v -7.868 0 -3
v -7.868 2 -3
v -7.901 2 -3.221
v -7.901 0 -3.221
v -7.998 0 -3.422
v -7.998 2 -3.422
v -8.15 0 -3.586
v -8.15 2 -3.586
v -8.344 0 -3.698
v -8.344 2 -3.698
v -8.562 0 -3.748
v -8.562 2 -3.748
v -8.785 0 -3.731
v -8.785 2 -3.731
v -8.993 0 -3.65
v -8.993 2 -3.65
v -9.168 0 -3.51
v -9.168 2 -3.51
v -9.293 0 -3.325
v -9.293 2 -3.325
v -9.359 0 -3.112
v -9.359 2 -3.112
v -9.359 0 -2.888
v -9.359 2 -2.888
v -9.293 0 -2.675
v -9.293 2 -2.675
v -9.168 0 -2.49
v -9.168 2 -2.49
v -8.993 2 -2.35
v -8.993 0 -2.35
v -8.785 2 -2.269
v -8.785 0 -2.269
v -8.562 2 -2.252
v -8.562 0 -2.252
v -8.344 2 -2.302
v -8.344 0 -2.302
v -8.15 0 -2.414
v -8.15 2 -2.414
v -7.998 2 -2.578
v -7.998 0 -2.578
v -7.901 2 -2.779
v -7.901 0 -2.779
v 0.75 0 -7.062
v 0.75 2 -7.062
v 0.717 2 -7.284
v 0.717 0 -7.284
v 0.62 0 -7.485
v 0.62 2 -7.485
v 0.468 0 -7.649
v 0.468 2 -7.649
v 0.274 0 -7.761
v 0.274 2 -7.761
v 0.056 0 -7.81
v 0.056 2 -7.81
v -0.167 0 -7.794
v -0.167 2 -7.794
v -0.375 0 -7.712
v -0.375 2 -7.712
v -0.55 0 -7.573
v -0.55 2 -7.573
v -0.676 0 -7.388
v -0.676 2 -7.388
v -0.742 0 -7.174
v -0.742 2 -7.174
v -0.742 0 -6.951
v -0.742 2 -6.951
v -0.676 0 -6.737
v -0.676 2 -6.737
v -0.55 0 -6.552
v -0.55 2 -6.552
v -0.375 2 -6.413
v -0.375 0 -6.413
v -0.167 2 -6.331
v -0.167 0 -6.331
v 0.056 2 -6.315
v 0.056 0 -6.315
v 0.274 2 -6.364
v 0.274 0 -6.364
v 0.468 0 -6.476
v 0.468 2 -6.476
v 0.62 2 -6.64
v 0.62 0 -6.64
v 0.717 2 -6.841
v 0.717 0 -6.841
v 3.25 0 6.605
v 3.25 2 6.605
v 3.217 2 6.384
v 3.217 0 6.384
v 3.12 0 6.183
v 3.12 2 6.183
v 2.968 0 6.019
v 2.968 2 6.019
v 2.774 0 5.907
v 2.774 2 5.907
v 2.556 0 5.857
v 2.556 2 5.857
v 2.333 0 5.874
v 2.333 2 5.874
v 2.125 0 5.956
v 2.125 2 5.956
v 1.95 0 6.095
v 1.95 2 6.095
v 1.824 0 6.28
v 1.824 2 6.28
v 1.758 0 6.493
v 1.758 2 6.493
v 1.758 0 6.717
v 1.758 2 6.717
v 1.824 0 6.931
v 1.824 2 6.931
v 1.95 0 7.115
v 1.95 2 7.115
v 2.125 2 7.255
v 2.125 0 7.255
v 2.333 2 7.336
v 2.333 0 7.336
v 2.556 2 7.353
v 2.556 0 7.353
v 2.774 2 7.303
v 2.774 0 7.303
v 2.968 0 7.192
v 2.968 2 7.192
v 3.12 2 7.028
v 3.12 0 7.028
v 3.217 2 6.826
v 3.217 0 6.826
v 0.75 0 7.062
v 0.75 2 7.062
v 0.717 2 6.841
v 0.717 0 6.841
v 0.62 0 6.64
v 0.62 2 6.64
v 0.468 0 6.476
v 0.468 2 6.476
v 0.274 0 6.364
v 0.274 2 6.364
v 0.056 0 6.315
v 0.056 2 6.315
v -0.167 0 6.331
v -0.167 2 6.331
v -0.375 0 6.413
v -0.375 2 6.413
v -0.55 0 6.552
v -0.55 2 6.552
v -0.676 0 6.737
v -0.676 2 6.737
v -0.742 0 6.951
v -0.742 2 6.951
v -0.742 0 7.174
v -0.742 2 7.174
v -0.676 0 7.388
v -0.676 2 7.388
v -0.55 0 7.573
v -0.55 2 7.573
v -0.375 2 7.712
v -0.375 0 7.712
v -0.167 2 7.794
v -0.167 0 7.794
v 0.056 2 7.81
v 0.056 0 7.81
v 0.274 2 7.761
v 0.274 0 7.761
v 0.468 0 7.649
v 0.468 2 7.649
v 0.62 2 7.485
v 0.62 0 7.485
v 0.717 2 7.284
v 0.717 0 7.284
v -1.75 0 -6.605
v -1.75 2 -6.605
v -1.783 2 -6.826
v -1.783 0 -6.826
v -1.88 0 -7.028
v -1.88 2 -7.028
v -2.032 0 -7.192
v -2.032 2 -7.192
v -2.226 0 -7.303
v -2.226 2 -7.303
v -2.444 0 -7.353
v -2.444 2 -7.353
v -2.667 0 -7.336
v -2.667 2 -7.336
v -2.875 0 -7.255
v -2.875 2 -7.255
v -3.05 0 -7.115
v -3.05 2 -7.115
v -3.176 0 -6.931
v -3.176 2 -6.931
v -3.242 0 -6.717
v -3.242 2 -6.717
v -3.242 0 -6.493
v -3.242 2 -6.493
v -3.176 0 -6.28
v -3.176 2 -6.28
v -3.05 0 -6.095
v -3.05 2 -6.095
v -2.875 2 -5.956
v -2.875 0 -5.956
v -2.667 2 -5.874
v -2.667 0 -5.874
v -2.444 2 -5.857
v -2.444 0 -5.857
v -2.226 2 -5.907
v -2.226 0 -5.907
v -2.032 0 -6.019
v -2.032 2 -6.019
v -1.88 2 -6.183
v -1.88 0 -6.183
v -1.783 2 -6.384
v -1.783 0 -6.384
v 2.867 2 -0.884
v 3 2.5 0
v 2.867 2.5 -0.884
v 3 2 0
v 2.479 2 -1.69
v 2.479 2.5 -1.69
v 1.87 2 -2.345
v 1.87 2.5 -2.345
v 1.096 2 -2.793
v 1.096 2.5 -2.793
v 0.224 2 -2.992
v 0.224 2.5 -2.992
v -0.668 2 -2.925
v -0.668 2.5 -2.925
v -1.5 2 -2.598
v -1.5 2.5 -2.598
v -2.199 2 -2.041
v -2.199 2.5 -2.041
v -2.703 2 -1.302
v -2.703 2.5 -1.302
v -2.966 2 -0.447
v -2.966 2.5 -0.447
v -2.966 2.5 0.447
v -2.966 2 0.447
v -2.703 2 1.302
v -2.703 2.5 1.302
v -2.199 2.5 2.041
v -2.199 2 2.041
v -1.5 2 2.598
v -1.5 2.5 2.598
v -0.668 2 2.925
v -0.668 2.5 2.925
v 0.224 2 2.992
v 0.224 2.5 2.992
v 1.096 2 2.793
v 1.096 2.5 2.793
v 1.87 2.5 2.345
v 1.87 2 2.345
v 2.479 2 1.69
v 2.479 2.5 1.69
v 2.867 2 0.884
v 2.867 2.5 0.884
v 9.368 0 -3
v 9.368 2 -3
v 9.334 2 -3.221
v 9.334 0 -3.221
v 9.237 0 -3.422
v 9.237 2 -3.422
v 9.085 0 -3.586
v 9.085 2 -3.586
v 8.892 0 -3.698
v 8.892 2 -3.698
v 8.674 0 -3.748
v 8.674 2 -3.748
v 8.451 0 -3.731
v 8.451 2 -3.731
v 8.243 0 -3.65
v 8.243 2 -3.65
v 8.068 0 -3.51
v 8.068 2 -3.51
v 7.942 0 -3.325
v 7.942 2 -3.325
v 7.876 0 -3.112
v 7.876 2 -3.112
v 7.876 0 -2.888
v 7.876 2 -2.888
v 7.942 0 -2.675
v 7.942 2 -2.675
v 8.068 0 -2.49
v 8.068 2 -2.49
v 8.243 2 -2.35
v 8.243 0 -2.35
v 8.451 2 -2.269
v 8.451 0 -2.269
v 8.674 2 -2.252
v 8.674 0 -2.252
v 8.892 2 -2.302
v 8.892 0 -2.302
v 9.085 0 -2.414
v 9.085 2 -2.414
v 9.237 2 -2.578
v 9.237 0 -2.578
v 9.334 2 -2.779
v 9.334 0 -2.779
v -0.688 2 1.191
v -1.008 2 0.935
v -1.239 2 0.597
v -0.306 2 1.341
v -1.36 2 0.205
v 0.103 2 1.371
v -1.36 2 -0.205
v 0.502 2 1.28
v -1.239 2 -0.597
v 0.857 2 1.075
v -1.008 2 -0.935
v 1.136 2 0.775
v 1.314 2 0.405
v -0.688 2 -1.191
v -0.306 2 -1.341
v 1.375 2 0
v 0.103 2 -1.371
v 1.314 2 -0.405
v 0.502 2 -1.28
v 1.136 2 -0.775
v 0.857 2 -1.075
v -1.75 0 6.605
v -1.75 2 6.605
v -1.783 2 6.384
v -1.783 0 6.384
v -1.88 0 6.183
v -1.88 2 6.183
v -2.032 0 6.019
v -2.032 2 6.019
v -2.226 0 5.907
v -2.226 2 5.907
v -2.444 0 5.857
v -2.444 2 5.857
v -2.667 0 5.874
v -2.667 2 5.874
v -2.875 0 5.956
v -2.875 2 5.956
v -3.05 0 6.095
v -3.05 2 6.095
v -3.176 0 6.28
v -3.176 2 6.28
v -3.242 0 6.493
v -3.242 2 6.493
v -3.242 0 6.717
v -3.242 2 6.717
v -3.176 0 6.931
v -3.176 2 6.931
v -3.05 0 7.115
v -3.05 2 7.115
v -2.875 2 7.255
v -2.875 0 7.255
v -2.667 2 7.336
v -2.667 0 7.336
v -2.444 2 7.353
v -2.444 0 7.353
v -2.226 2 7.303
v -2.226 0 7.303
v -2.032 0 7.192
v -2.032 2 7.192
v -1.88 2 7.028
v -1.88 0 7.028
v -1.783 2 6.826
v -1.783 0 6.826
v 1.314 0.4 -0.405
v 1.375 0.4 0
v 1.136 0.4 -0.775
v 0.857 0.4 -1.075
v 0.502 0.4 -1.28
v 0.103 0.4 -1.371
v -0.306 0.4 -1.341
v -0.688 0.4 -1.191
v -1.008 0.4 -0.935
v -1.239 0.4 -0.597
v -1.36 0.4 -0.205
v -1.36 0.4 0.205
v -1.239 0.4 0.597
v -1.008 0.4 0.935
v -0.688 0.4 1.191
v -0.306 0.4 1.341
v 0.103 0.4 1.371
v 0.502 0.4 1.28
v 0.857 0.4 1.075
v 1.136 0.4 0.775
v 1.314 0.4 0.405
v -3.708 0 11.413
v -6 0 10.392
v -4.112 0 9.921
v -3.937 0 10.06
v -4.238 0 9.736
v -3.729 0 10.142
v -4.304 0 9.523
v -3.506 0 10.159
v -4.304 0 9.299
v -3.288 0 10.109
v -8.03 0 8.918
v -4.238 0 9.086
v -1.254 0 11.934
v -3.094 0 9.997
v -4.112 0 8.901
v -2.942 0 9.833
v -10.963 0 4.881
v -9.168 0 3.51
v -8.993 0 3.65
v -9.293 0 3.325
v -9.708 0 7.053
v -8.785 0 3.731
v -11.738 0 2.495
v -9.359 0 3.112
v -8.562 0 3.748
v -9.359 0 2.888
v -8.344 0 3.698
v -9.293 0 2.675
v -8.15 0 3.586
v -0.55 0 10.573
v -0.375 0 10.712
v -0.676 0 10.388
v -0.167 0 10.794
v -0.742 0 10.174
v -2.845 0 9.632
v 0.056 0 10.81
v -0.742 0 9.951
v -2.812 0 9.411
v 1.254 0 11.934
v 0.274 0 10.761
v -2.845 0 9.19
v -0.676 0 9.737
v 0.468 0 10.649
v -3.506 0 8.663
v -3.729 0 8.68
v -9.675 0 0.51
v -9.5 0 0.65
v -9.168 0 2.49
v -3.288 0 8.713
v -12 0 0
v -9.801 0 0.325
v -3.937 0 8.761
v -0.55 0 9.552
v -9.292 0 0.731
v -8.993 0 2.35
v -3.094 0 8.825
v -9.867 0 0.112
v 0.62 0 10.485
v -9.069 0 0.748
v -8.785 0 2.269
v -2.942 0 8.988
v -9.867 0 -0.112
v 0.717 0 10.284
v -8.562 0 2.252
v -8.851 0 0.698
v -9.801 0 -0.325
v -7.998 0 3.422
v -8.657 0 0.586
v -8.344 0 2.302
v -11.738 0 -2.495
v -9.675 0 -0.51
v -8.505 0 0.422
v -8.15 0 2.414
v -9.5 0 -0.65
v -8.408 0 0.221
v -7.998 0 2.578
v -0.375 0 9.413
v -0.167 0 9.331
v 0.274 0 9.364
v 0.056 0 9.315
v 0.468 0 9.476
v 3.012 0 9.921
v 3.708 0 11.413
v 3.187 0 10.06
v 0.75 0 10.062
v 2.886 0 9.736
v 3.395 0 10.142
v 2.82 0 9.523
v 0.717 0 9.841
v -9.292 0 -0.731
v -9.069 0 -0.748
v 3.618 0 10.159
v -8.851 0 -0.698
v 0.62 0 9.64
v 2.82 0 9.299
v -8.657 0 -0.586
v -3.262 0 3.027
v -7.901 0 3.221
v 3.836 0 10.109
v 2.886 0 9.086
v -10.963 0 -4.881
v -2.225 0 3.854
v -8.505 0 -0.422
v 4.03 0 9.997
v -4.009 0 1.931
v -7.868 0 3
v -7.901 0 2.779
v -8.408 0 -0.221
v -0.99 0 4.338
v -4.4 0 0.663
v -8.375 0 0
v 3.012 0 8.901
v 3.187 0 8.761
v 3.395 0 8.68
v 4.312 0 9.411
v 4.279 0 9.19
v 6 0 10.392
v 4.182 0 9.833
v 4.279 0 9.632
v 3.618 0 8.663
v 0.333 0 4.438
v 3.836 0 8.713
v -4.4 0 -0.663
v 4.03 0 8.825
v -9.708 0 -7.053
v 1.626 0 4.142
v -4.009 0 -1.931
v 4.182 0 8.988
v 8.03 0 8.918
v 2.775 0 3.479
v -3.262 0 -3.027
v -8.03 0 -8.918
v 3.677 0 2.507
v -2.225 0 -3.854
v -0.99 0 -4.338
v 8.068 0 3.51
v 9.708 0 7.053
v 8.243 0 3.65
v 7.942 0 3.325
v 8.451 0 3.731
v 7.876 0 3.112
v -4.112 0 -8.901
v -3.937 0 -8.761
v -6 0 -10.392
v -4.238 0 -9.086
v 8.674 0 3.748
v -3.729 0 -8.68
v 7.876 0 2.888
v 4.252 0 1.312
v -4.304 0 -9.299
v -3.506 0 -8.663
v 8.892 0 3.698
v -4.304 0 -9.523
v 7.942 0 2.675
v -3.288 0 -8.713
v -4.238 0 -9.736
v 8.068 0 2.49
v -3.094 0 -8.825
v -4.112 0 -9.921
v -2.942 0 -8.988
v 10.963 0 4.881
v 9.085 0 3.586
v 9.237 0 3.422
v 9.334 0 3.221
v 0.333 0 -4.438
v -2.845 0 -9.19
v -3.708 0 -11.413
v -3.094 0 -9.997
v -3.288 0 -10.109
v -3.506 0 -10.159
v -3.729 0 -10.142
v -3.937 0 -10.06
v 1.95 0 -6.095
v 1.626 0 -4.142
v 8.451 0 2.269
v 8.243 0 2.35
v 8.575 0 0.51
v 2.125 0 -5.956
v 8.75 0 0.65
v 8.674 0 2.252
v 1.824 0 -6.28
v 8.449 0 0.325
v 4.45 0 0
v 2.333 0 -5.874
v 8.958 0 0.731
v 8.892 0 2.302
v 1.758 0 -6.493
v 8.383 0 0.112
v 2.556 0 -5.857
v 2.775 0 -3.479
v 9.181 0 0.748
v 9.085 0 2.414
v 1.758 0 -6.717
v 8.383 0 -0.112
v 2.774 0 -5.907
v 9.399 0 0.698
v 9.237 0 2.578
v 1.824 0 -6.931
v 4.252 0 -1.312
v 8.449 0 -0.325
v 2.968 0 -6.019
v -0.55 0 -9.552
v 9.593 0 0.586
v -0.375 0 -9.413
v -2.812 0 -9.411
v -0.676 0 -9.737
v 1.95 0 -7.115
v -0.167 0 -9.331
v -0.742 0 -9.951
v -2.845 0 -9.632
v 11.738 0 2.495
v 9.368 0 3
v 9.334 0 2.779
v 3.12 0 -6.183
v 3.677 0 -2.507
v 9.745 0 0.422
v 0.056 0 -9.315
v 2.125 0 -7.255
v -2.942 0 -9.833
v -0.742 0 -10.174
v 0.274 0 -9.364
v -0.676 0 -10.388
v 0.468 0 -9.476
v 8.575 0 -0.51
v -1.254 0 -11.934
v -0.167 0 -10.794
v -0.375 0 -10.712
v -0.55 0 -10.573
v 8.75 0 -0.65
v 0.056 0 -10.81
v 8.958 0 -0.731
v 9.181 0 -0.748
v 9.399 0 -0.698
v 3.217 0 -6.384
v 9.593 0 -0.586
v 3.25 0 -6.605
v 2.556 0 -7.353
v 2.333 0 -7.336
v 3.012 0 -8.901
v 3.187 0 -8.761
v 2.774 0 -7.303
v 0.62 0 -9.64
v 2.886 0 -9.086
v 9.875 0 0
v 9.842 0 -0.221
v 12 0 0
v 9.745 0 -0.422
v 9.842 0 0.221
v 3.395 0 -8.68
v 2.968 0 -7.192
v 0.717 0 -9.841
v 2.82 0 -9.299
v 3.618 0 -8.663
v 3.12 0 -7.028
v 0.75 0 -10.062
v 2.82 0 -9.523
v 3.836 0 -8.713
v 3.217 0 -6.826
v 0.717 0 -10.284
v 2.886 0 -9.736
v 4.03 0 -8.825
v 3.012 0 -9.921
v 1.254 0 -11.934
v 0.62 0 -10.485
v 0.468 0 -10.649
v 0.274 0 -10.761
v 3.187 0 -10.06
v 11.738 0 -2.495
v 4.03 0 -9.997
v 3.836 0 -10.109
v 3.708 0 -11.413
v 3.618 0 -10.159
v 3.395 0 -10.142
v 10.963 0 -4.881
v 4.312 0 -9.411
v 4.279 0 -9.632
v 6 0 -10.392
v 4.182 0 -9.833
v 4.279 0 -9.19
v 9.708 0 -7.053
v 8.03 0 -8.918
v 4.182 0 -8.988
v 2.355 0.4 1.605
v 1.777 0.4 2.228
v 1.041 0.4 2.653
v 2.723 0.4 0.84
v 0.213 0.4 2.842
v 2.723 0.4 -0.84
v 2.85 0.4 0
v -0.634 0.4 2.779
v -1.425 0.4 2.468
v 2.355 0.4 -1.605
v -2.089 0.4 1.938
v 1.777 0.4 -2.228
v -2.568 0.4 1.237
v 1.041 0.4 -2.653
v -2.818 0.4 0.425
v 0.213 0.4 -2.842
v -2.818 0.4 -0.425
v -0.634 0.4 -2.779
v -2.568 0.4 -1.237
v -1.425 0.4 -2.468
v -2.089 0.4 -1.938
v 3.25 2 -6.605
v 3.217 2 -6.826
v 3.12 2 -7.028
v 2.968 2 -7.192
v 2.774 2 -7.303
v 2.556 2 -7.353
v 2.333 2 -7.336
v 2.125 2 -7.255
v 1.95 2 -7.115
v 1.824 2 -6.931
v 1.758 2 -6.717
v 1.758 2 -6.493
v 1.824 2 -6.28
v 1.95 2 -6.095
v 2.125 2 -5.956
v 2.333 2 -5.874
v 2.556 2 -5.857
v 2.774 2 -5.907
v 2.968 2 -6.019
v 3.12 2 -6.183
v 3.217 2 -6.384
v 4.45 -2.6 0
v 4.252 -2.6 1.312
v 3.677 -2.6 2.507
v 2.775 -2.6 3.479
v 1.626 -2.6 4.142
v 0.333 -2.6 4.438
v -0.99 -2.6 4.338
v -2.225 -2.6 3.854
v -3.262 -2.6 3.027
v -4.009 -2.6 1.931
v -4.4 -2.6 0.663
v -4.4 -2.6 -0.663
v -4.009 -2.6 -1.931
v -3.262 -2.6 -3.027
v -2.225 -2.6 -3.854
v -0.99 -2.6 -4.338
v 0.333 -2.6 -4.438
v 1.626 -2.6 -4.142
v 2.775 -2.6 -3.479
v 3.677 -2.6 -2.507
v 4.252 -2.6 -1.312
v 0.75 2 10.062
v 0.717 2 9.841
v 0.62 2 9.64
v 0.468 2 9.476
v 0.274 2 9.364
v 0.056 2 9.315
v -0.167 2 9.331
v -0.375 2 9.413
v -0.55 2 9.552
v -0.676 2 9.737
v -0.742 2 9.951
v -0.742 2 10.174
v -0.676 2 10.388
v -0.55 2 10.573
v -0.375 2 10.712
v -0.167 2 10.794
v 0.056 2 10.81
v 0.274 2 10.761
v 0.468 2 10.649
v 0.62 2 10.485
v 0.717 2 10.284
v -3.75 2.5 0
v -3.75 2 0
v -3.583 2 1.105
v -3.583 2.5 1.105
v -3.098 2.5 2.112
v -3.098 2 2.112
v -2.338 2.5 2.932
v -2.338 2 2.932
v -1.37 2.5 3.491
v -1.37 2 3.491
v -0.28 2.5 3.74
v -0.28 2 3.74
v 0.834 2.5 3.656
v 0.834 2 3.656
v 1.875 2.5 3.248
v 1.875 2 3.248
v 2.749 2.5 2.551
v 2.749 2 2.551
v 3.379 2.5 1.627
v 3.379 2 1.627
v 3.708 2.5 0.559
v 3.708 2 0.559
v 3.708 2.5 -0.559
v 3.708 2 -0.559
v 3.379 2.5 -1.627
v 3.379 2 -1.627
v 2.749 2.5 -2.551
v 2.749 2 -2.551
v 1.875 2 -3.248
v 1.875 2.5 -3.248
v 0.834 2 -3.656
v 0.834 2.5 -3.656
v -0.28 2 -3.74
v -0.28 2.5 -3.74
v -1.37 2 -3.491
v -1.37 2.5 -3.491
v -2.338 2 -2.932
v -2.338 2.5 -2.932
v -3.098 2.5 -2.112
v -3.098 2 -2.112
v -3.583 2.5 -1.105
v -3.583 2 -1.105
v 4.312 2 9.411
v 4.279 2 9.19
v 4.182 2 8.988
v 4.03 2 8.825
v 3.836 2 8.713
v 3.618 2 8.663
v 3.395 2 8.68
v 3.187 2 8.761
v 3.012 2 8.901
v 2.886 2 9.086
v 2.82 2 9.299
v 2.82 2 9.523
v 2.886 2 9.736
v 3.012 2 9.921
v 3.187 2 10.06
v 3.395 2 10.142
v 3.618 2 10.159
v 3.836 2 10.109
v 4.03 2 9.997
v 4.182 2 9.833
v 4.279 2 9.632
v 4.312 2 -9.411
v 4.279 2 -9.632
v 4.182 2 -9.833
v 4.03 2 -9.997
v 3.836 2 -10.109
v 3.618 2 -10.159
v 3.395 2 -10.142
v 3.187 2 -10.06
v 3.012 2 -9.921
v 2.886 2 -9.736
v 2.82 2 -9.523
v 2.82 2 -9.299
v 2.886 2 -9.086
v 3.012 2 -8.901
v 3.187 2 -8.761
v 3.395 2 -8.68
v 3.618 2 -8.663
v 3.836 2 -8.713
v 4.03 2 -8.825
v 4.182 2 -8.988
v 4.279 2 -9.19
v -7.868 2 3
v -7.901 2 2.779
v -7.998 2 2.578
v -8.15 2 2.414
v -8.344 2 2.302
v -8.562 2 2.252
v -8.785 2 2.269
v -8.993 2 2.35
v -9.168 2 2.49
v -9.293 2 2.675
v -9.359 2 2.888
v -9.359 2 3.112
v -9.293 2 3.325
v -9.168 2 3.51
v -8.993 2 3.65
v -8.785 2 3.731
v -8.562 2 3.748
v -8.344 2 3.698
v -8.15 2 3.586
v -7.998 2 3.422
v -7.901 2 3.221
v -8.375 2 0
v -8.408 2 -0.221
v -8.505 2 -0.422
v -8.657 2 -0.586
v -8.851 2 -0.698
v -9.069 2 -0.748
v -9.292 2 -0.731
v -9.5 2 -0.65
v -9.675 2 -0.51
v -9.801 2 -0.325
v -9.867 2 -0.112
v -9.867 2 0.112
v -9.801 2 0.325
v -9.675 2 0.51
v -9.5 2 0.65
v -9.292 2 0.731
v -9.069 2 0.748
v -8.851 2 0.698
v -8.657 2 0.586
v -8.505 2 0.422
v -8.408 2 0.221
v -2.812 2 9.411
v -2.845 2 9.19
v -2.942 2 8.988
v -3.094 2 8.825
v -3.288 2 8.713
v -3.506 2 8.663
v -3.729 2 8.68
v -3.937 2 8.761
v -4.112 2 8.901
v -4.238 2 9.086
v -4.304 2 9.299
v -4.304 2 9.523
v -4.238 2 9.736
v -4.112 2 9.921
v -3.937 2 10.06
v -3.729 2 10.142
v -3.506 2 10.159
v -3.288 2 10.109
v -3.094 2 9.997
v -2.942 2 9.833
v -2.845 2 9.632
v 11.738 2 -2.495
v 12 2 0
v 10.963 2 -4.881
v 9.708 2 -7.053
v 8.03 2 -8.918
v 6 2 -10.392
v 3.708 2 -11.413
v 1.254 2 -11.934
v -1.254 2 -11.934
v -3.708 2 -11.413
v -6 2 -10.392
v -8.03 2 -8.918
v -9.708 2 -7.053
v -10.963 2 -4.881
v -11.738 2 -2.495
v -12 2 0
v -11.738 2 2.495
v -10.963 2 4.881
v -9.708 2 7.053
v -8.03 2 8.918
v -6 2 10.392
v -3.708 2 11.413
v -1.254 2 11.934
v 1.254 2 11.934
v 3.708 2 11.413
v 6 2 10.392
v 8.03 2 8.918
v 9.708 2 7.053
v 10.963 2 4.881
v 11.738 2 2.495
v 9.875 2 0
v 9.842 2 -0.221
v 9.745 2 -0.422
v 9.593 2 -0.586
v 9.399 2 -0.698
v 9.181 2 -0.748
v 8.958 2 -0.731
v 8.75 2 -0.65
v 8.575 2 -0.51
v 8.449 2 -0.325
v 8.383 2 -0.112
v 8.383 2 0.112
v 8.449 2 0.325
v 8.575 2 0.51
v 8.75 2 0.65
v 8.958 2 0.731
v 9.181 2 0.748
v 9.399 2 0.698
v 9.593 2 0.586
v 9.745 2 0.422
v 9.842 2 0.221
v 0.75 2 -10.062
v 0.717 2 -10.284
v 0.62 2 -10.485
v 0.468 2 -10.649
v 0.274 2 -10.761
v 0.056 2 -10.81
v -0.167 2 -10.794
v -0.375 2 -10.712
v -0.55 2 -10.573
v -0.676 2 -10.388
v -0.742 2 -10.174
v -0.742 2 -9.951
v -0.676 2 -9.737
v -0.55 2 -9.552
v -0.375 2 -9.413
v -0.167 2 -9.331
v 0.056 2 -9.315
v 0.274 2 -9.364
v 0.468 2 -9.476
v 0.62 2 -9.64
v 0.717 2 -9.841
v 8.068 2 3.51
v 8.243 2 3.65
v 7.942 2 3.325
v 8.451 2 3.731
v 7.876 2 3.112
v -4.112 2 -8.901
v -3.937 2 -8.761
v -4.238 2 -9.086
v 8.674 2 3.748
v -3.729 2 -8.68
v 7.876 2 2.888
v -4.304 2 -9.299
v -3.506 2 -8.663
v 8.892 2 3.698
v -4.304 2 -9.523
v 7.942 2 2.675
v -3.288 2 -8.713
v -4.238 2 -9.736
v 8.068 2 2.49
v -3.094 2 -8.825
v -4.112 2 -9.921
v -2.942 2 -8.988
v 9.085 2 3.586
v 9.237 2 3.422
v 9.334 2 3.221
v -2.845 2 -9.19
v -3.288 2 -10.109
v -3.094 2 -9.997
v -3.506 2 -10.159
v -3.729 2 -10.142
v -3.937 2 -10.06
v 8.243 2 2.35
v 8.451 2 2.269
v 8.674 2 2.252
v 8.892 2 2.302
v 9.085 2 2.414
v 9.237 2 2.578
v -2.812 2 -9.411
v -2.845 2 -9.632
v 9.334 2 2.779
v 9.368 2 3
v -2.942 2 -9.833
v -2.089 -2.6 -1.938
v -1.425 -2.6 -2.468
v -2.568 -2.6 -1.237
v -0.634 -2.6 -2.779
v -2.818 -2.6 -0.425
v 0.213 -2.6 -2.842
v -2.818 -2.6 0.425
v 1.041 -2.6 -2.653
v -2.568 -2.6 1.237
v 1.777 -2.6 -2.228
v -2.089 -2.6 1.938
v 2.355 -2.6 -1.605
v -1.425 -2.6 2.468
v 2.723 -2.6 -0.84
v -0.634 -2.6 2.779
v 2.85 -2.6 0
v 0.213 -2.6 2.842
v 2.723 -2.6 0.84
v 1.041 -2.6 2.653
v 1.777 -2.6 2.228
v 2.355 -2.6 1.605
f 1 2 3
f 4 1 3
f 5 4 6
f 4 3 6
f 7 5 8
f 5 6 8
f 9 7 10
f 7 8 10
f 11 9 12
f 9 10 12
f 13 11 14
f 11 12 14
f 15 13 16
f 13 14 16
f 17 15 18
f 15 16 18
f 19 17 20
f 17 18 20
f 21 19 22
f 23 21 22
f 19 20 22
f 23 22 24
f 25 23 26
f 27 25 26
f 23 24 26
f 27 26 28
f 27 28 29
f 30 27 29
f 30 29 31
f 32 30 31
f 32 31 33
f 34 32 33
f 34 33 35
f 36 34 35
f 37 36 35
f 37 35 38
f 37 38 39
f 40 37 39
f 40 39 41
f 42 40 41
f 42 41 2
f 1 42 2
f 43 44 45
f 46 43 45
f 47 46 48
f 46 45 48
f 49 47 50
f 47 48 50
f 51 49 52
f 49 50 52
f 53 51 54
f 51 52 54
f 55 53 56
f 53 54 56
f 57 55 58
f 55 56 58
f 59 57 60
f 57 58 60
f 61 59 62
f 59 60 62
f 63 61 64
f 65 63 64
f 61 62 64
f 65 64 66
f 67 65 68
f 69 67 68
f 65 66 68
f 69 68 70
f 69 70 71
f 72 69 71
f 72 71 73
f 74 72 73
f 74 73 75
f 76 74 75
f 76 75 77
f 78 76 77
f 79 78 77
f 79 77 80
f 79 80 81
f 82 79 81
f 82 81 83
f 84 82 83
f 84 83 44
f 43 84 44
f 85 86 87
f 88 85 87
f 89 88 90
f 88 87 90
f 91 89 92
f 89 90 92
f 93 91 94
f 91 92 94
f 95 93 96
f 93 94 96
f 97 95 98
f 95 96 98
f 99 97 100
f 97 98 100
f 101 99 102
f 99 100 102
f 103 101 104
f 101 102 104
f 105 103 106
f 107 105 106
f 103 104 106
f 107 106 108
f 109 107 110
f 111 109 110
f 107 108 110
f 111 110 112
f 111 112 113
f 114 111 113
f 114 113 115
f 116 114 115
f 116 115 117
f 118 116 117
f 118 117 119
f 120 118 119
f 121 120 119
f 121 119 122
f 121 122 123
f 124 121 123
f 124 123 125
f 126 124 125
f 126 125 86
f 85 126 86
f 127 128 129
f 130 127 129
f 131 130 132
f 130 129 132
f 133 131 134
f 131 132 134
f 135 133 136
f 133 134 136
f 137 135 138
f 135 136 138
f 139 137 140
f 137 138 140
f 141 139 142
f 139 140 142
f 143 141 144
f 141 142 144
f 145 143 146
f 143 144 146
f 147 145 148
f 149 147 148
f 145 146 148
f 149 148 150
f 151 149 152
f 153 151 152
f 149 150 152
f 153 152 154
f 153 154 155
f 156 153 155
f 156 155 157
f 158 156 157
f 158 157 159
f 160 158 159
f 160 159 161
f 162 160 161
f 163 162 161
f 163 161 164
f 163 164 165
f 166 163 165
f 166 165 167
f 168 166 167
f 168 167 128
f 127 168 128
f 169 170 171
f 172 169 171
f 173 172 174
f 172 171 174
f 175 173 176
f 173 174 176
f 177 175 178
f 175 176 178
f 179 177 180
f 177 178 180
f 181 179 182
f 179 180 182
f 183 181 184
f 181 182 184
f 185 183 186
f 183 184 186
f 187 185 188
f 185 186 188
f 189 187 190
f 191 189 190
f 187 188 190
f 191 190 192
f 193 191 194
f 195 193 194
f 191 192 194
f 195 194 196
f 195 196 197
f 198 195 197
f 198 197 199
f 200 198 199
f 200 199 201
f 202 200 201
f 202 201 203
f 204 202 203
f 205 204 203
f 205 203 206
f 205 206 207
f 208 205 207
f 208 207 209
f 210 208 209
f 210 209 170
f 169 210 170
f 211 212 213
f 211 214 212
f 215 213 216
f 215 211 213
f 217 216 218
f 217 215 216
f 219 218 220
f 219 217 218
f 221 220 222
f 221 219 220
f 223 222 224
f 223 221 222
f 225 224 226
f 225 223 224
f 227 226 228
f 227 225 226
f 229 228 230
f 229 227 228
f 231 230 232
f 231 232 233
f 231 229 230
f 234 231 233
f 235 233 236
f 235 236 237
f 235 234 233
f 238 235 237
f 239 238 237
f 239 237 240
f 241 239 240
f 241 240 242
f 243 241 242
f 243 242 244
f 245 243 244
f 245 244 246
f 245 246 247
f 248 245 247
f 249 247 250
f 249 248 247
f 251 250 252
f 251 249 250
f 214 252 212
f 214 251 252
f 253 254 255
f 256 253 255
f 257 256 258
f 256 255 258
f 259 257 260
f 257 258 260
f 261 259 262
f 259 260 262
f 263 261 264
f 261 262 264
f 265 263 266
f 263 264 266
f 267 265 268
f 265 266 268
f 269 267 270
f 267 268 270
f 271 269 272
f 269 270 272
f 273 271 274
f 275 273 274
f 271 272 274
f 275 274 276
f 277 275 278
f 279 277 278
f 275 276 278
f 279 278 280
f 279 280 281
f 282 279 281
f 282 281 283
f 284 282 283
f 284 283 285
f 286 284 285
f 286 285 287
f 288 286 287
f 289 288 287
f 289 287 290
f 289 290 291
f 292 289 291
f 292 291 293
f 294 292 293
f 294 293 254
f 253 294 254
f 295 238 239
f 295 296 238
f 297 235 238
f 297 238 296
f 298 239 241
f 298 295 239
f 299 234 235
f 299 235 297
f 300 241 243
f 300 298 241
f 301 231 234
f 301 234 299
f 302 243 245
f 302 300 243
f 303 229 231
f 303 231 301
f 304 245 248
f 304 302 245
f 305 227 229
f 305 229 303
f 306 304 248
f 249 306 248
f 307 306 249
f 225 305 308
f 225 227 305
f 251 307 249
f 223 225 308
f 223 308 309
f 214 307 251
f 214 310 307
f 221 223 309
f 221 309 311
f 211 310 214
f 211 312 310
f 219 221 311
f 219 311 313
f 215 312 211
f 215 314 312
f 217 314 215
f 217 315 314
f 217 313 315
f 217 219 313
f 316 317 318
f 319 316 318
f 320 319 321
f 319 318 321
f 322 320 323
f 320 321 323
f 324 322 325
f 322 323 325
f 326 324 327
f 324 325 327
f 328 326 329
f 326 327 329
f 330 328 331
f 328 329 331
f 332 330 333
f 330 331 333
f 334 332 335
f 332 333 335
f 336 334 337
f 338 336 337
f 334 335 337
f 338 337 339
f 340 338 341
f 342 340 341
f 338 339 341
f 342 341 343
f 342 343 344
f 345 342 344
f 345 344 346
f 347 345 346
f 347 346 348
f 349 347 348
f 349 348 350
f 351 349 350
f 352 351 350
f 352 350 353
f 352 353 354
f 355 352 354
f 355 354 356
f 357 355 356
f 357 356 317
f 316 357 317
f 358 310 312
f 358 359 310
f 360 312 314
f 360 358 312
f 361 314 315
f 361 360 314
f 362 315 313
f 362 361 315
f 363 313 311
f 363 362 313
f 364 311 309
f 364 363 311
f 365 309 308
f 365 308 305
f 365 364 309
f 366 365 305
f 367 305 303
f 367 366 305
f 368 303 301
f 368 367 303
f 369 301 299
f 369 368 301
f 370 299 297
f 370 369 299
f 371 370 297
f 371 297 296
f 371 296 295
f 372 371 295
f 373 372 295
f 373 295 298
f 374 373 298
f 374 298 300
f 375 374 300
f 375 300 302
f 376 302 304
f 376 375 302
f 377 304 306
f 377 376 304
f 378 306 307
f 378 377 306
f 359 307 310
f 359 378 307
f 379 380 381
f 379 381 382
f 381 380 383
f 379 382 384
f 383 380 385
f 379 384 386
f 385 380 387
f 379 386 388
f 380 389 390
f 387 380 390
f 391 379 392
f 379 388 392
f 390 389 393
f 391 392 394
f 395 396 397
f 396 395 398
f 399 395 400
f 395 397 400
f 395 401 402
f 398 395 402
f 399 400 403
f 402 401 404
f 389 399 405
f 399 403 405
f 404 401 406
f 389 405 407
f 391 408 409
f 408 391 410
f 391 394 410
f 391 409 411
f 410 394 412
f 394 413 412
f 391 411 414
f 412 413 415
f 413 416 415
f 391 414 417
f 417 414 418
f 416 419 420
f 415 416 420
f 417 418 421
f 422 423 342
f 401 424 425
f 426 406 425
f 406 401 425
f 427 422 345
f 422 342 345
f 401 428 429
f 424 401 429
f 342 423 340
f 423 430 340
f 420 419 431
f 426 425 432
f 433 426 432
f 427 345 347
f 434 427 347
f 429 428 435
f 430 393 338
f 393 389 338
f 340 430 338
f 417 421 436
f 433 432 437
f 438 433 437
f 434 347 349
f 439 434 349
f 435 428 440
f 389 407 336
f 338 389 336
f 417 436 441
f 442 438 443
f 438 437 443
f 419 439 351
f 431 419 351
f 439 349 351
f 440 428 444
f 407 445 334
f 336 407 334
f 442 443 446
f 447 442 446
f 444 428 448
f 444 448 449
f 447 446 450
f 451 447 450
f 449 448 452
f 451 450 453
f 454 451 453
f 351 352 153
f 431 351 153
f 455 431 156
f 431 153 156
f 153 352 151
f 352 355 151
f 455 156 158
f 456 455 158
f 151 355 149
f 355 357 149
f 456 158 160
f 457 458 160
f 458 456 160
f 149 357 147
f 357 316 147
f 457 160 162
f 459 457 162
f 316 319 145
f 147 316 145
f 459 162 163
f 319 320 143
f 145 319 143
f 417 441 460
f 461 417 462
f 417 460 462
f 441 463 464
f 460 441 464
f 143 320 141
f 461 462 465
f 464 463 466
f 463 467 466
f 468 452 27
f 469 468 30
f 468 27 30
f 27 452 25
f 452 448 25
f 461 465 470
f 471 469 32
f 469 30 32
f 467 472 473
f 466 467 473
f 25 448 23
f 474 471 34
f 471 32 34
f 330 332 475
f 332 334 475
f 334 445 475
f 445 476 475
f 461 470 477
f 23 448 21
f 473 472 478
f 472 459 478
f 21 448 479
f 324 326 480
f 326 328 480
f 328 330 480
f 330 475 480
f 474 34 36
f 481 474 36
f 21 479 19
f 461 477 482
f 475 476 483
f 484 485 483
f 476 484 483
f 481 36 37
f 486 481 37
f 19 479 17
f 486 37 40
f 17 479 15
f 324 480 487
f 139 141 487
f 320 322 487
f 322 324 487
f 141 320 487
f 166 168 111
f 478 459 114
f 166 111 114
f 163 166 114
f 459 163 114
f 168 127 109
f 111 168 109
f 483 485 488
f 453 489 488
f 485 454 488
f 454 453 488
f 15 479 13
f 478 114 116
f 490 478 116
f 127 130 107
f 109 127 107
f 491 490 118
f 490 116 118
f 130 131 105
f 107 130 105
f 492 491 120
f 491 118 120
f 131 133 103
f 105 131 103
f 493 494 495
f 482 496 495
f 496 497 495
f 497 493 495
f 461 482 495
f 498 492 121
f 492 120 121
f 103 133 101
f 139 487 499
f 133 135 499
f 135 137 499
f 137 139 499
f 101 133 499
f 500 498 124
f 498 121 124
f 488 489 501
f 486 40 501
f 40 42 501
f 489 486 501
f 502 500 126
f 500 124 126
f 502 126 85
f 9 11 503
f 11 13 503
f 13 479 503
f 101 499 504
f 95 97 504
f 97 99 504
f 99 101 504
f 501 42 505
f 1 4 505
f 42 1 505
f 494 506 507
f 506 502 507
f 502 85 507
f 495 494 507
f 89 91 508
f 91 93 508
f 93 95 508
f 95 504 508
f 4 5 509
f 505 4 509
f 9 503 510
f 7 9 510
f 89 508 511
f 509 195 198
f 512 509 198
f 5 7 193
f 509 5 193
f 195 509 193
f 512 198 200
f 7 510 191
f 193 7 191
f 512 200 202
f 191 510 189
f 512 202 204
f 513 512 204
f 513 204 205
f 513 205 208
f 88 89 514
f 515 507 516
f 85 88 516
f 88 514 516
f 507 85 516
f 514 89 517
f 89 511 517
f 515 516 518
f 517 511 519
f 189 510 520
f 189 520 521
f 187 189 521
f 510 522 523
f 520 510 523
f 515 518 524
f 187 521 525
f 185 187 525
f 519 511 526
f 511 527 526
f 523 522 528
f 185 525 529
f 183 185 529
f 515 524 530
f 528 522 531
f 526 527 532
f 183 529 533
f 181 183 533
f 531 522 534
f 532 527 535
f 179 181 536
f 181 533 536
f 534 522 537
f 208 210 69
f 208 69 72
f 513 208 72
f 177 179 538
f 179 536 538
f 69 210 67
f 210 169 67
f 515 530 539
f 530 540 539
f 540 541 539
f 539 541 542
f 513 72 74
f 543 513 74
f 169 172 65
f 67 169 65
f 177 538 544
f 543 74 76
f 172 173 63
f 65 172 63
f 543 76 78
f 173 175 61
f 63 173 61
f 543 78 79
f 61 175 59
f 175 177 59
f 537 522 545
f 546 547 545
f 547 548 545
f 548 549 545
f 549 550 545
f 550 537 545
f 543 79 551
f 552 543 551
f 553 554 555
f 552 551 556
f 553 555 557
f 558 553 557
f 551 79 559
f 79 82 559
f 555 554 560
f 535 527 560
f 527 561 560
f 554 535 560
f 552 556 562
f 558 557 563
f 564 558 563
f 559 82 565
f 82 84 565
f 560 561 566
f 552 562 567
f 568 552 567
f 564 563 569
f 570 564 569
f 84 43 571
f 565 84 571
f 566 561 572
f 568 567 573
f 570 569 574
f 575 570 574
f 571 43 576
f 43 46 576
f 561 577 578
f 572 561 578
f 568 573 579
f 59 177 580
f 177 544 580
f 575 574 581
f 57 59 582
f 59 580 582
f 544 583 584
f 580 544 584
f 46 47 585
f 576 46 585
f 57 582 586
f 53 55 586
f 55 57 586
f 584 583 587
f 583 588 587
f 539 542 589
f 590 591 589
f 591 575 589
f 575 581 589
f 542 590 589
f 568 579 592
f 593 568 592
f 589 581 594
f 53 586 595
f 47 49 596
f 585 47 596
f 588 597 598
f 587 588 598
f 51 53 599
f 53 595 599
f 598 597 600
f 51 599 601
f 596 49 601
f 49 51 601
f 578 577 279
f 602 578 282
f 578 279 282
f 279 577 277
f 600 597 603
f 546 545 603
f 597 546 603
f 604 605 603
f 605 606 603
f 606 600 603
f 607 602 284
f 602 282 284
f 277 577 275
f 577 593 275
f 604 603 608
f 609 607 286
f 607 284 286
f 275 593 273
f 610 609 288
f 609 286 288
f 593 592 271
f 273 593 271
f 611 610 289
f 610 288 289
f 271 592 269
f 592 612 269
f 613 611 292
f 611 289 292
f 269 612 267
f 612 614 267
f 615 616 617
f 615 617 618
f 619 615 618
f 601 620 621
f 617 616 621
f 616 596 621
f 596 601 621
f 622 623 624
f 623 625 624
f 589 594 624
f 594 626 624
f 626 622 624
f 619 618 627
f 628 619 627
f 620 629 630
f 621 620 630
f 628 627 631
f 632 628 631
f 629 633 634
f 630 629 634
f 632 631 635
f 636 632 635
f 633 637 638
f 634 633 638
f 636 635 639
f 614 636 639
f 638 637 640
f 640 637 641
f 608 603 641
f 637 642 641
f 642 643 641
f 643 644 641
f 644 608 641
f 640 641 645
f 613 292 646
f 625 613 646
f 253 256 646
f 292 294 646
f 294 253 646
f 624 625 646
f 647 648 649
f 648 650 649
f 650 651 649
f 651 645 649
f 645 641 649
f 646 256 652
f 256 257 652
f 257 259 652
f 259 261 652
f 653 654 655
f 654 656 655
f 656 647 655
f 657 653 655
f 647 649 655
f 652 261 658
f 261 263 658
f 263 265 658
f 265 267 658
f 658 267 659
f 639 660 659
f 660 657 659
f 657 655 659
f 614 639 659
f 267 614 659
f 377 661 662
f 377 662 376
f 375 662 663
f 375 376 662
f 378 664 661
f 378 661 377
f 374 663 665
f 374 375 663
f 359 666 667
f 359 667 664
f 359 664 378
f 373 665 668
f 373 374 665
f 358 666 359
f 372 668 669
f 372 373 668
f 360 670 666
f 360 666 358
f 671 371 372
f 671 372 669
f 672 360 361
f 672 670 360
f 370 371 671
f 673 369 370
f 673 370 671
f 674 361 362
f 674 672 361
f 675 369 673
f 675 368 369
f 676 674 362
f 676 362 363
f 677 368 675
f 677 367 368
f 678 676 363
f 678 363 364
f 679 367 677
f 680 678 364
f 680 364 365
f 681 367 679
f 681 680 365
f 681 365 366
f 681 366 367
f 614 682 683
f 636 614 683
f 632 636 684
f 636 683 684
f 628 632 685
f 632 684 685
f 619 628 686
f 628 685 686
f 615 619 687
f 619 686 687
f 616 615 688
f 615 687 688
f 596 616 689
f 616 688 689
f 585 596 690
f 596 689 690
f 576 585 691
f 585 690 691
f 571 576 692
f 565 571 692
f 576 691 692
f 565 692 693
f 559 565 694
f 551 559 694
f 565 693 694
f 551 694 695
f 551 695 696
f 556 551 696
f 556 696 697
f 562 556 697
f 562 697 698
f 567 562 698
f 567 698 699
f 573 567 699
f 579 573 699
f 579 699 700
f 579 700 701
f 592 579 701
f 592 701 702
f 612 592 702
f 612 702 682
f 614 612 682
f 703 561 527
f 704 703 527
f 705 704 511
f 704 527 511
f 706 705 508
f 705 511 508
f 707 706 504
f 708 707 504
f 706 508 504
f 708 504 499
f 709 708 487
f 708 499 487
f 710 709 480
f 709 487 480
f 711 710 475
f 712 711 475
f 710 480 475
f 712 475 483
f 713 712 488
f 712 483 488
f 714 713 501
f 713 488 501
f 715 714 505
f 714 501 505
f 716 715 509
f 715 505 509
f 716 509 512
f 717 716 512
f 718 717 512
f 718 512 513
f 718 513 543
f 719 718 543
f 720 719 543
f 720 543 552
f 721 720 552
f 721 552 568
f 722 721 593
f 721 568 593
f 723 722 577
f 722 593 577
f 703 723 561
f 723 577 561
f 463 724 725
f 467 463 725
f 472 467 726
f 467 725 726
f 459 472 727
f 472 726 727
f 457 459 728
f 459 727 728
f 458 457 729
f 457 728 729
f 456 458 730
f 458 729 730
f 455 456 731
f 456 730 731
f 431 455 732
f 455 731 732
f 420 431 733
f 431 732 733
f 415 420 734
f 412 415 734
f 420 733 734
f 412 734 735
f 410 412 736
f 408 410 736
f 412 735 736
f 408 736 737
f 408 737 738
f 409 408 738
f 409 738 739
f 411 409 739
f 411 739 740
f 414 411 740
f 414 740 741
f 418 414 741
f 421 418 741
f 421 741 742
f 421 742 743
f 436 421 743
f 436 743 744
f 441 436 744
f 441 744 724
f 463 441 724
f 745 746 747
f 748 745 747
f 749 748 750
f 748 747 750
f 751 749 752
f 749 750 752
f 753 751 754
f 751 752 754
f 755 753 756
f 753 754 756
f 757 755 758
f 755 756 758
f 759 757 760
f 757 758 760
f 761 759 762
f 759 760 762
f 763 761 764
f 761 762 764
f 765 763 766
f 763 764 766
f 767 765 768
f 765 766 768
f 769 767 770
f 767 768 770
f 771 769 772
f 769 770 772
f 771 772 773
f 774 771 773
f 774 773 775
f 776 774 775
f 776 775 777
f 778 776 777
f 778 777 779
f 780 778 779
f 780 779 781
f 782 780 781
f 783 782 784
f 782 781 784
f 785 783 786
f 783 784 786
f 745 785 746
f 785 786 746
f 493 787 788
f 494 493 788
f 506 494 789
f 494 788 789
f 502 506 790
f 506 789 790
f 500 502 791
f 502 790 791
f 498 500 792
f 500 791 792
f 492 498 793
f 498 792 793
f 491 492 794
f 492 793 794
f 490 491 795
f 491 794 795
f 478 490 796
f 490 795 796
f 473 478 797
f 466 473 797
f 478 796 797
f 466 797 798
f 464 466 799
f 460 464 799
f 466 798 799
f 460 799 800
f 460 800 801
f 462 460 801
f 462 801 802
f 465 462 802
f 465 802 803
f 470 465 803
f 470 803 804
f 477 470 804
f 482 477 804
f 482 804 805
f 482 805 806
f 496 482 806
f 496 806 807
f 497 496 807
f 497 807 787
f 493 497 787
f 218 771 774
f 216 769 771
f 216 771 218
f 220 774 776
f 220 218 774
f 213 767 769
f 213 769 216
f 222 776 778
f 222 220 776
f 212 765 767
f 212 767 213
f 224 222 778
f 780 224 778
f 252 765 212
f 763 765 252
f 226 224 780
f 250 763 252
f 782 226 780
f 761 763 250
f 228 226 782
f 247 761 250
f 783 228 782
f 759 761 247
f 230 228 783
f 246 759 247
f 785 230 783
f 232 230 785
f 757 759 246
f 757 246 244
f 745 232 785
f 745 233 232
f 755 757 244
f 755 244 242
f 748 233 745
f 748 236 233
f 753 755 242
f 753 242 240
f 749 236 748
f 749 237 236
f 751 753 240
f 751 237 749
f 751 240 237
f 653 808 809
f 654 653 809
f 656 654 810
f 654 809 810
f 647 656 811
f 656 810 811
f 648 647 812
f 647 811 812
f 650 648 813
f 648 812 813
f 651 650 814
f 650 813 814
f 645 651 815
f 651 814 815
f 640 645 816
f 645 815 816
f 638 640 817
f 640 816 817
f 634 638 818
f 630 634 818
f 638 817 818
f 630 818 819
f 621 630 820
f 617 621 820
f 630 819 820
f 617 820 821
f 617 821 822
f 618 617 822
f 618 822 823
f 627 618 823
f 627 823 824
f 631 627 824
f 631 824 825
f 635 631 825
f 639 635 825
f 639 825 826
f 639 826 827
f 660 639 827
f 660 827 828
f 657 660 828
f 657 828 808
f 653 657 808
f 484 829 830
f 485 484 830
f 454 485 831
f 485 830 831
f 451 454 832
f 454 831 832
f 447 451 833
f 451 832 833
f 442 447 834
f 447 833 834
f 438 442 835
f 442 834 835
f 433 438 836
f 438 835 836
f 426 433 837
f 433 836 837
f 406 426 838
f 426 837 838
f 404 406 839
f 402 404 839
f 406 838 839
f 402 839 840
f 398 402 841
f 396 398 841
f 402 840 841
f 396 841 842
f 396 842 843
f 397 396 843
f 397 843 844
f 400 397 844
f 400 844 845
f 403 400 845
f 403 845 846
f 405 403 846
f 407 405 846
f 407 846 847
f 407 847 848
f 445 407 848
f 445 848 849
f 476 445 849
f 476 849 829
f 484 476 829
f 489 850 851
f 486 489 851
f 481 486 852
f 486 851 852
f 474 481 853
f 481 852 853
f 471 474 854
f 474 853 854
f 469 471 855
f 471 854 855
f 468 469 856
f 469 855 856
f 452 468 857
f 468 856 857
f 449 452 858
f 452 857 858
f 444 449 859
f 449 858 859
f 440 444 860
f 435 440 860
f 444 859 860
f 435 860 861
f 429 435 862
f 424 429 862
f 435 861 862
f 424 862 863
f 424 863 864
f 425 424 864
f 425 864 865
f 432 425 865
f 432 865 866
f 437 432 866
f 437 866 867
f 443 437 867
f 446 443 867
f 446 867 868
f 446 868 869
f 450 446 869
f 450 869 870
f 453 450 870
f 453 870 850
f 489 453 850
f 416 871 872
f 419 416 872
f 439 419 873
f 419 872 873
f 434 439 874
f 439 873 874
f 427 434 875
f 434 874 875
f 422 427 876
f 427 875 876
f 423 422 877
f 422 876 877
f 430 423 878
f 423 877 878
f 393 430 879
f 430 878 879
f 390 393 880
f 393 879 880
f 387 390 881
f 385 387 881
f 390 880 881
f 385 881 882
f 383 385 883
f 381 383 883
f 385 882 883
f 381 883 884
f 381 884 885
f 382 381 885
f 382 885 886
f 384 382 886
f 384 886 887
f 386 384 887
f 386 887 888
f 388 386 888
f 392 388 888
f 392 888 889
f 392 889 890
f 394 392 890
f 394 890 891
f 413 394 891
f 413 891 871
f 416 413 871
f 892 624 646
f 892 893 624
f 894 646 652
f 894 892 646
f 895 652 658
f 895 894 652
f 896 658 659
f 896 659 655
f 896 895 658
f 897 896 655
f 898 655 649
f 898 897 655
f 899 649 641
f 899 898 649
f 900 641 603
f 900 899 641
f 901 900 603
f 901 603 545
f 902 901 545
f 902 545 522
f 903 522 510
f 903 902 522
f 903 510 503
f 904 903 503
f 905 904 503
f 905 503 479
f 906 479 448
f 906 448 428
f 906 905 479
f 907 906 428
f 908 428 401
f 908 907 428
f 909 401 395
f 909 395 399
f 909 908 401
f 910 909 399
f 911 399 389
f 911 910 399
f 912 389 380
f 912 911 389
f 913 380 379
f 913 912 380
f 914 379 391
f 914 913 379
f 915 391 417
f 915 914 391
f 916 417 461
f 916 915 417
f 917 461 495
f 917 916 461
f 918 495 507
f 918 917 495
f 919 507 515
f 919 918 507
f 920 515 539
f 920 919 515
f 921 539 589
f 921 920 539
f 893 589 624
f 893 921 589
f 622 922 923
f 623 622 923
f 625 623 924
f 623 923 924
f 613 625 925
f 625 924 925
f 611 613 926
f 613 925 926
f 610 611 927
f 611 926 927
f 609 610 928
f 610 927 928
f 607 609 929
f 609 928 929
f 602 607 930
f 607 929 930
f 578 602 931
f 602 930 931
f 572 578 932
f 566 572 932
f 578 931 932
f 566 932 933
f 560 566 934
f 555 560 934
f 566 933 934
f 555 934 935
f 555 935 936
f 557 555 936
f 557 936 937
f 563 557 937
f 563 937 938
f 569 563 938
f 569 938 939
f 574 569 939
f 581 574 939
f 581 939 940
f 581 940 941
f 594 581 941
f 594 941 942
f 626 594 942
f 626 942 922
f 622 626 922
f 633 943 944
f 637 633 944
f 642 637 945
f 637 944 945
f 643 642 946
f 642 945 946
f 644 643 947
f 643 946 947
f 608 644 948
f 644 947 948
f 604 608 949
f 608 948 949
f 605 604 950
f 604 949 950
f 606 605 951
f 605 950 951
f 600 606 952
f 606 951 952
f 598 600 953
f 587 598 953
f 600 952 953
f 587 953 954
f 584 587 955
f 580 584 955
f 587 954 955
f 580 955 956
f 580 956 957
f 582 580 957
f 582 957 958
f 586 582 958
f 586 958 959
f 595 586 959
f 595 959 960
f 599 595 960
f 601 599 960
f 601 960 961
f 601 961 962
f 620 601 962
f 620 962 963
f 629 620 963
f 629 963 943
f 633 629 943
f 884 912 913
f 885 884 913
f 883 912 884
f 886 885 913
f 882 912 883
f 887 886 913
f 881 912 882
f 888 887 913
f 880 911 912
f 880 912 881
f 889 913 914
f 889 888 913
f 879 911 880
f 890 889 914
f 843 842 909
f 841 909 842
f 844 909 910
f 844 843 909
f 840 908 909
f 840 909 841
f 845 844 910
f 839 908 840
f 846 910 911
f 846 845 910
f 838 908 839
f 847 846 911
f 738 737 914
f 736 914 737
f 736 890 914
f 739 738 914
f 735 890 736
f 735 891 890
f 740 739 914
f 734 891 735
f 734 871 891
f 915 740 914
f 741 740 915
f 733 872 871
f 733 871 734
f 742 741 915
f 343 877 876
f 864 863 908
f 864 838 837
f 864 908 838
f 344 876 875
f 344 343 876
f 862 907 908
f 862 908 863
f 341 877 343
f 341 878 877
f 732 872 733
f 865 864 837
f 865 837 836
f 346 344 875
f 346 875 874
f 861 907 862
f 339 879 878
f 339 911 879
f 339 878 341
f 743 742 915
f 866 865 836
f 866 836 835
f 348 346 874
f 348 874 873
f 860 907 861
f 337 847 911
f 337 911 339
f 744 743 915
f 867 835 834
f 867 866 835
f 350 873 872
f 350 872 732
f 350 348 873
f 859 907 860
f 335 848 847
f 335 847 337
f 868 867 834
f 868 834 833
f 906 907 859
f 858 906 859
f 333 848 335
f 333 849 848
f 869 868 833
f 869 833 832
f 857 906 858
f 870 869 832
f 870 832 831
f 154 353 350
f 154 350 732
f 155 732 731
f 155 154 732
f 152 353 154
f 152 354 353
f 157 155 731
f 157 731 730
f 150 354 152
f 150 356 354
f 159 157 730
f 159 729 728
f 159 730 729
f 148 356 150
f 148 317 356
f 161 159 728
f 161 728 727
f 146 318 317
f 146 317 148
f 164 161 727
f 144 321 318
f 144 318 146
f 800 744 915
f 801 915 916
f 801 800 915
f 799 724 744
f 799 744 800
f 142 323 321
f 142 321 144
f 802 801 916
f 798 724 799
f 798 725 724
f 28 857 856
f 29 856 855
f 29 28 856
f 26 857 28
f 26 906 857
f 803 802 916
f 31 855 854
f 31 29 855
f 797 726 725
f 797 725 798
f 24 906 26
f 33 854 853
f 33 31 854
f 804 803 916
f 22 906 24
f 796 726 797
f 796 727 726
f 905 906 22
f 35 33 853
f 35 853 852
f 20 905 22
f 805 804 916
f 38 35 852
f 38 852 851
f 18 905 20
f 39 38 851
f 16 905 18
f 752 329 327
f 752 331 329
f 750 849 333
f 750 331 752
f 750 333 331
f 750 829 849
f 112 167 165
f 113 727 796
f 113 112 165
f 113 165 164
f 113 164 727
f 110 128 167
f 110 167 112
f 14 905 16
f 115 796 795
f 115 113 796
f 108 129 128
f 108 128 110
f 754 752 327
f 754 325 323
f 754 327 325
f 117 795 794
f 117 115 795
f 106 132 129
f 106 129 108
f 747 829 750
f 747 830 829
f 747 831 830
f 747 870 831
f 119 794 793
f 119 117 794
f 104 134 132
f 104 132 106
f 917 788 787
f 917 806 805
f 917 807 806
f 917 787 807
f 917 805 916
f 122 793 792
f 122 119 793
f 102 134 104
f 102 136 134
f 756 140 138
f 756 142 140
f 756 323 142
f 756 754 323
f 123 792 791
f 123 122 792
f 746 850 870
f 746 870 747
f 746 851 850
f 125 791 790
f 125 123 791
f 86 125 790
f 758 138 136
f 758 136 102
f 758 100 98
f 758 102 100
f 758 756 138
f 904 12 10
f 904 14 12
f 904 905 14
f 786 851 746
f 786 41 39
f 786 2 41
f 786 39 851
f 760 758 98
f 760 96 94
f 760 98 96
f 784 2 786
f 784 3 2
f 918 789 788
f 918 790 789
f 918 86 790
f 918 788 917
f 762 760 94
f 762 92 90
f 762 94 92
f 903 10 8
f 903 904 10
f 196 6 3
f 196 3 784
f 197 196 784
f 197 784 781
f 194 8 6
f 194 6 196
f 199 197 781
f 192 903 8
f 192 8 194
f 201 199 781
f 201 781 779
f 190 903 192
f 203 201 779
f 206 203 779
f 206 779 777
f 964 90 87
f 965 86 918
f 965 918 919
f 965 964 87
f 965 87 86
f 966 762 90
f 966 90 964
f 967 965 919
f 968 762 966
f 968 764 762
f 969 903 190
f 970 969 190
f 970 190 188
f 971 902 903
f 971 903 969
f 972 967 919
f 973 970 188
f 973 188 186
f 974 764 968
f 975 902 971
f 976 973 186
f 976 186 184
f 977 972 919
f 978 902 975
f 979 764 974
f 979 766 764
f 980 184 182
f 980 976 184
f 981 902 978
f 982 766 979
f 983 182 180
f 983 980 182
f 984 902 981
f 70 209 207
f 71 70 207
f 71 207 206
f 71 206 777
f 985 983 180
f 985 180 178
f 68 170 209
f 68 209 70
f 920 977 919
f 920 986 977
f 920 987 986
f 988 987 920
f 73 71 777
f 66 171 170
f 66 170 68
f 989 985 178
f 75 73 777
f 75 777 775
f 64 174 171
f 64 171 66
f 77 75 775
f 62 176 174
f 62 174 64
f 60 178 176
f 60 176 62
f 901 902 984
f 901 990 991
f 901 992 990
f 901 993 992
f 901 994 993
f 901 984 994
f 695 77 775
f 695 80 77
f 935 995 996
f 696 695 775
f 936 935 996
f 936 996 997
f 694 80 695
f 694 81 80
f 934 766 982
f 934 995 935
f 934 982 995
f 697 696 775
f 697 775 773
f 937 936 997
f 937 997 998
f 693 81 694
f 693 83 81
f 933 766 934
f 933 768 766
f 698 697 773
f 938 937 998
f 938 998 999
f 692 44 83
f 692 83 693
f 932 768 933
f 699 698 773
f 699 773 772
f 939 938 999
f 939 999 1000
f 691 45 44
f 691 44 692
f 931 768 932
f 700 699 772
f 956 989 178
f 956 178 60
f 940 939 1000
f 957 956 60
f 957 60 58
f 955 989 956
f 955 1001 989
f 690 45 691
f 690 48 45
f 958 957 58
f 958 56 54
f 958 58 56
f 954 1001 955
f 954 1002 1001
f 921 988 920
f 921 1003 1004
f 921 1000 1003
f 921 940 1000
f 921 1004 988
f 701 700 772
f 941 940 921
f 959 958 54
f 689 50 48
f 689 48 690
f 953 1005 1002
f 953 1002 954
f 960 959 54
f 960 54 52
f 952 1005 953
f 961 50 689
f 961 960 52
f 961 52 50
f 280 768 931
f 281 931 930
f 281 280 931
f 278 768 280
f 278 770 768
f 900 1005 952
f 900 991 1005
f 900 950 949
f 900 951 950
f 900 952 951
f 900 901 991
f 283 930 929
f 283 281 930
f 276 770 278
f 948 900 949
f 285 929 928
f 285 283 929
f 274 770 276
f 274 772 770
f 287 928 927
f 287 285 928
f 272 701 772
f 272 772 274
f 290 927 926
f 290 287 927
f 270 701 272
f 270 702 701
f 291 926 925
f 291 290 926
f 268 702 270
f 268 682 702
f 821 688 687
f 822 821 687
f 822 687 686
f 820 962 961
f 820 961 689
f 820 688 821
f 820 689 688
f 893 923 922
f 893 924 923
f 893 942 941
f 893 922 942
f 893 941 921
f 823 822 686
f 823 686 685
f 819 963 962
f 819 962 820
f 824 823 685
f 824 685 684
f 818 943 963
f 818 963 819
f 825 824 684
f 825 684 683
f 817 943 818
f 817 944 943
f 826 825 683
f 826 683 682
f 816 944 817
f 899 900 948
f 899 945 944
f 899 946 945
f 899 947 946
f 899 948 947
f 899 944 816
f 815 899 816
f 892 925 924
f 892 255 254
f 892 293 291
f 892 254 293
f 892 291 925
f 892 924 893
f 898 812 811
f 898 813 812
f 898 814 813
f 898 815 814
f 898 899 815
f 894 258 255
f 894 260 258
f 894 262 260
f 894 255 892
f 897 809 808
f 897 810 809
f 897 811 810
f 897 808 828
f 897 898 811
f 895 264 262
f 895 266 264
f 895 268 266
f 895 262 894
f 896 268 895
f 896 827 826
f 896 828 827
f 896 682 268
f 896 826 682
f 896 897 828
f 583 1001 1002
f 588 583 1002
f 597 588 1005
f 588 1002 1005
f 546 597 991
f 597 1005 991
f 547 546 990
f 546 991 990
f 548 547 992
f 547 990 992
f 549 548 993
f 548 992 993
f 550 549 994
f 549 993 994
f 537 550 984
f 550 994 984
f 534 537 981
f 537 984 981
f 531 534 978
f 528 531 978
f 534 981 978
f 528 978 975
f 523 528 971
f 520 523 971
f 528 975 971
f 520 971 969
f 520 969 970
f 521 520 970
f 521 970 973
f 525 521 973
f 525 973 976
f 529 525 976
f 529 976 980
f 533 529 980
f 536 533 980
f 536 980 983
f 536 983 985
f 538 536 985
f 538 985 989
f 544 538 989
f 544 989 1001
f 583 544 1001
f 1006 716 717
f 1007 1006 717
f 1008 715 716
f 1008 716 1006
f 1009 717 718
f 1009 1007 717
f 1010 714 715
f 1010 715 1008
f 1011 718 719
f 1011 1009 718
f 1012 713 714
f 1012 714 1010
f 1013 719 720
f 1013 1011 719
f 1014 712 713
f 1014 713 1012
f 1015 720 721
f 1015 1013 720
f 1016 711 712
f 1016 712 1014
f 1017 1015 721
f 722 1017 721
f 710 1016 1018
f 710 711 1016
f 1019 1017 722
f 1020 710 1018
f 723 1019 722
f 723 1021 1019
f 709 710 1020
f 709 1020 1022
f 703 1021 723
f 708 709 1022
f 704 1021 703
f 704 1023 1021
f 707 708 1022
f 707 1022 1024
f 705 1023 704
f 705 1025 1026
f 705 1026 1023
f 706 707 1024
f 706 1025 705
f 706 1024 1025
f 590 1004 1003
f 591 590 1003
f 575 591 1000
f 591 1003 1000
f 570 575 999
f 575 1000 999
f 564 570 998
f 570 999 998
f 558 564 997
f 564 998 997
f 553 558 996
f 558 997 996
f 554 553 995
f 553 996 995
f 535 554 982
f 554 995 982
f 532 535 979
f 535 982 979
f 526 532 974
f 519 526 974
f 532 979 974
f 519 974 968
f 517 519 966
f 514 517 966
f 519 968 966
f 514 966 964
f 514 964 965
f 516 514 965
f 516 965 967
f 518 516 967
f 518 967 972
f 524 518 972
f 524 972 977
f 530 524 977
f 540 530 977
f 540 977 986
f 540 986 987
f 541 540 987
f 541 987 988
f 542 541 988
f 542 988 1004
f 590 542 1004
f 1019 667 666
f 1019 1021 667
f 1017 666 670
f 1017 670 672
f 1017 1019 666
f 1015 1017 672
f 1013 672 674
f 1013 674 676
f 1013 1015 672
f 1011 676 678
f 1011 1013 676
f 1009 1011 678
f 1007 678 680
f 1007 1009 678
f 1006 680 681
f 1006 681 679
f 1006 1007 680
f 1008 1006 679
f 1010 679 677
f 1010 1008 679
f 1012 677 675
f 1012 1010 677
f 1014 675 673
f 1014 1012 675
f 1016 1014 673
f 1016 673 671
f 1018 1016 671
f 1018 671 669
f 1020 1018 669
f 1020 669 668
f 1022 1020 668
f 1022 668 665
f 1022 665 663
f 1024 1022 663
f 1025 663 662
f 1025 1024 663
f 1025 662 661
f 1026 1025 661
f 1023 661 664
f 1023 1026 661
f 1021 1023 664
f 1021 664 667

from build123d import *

# Parameters (mm, degrees)
SKETCH1_W                      = 12
SKETCH1_H                      = 2
SKETCH2_R                      = 4.45
BOSS_EXTRUDE1_DEPTH            = 2.6
SKETCH3_R                      = 3.75
BOSS_EXTRUDE2_DEPTH            = 0.5
F_1_5_1_5_DIAMETER_HOLE1_D     = 1.5
F_1_5_1_5_DIAMETER_HOLE1_DEPTH = 2.5


with BuildPart() as part:
    # Sketch1 → Revolve1 (revolve)
    with BuildSketch(Plane(origin=(0, 0, 0), x_dir=(-1, 0, 0), z_dir=(0, 0, -1))):
        with Locations((-6, 1)):
            Rectangle(SKETCH1_W, SKETCH1_H)
    revolve(axis=Axis((0, 0, 0), (0, 1, 0)))

    # Sketch2 → Boss-Extrude1 (add)
    with BuildSketch(Plane.XZ):
        Circle(SKETCH2_R)
    extrude(amount=BOSS_EXTRUDE1_DEPTH)

    # Sketch3 → Boss-Extrude2 (add)
    with BuildSketch(Plane(origin=(0, 2, 0), x_dir=(-1, 0, 0), z_dir=(0, 1, 0))):
        Circle(SKETCH3_R)
    extrude(amount=BOSS_EXTRUDE2_DEPTH)

    # Sketch4 → Cut-Revolve1 (revolve, cut)
    with BuildSketch(Plane(origin=(0, 0, 0), x_dir=(-1, 0, 0), z_dir=(0, 0, -1))):
        Polygon((-2.85, -2.6), (0, -2.6), (0, 2.5), (-3, 2.5), (-3, 2), (-1.375, 2), (-1.375, 0.4), (-2.85, 0.4), align=None)
    revolve(axis=Axis((0, -2.6, 0), (0, 1, 0)), mode=Mode.SUBTRACT)

    # Ø1.5 (1.5) Diameter Hole1
    with Locations(Plane(origin=(0, 0, 0), x_dir=(-1, 0, 0), z_dir=(0, -1, 0))):
        with Locations((-9.125, 0), (9.125, 0), (-8.617750577, -3), (-8.617750577, 3), (8.617750577, -3), (8.617750577, 3), (0, 7.0625), (0, -7.0625), (-2.5, 6.605218108), (2.5, 6.605218108), (-2.5, -6.605218108), (2.5, -6.605218108), (0, 10.0625), (0, -10.0625), (-3.561946903, 9.410974472), (3.561946903, 9.410974472), (-3.561946903, -9.410974472), (3.561946903, -9.410974472)):
            Hole(F_1_5_1_5_DIAMETER_HOLE1_D / 2, depth=F_1_5_1_5_DIAMETER_HOLE1_DEPTH)


solid = part.part
